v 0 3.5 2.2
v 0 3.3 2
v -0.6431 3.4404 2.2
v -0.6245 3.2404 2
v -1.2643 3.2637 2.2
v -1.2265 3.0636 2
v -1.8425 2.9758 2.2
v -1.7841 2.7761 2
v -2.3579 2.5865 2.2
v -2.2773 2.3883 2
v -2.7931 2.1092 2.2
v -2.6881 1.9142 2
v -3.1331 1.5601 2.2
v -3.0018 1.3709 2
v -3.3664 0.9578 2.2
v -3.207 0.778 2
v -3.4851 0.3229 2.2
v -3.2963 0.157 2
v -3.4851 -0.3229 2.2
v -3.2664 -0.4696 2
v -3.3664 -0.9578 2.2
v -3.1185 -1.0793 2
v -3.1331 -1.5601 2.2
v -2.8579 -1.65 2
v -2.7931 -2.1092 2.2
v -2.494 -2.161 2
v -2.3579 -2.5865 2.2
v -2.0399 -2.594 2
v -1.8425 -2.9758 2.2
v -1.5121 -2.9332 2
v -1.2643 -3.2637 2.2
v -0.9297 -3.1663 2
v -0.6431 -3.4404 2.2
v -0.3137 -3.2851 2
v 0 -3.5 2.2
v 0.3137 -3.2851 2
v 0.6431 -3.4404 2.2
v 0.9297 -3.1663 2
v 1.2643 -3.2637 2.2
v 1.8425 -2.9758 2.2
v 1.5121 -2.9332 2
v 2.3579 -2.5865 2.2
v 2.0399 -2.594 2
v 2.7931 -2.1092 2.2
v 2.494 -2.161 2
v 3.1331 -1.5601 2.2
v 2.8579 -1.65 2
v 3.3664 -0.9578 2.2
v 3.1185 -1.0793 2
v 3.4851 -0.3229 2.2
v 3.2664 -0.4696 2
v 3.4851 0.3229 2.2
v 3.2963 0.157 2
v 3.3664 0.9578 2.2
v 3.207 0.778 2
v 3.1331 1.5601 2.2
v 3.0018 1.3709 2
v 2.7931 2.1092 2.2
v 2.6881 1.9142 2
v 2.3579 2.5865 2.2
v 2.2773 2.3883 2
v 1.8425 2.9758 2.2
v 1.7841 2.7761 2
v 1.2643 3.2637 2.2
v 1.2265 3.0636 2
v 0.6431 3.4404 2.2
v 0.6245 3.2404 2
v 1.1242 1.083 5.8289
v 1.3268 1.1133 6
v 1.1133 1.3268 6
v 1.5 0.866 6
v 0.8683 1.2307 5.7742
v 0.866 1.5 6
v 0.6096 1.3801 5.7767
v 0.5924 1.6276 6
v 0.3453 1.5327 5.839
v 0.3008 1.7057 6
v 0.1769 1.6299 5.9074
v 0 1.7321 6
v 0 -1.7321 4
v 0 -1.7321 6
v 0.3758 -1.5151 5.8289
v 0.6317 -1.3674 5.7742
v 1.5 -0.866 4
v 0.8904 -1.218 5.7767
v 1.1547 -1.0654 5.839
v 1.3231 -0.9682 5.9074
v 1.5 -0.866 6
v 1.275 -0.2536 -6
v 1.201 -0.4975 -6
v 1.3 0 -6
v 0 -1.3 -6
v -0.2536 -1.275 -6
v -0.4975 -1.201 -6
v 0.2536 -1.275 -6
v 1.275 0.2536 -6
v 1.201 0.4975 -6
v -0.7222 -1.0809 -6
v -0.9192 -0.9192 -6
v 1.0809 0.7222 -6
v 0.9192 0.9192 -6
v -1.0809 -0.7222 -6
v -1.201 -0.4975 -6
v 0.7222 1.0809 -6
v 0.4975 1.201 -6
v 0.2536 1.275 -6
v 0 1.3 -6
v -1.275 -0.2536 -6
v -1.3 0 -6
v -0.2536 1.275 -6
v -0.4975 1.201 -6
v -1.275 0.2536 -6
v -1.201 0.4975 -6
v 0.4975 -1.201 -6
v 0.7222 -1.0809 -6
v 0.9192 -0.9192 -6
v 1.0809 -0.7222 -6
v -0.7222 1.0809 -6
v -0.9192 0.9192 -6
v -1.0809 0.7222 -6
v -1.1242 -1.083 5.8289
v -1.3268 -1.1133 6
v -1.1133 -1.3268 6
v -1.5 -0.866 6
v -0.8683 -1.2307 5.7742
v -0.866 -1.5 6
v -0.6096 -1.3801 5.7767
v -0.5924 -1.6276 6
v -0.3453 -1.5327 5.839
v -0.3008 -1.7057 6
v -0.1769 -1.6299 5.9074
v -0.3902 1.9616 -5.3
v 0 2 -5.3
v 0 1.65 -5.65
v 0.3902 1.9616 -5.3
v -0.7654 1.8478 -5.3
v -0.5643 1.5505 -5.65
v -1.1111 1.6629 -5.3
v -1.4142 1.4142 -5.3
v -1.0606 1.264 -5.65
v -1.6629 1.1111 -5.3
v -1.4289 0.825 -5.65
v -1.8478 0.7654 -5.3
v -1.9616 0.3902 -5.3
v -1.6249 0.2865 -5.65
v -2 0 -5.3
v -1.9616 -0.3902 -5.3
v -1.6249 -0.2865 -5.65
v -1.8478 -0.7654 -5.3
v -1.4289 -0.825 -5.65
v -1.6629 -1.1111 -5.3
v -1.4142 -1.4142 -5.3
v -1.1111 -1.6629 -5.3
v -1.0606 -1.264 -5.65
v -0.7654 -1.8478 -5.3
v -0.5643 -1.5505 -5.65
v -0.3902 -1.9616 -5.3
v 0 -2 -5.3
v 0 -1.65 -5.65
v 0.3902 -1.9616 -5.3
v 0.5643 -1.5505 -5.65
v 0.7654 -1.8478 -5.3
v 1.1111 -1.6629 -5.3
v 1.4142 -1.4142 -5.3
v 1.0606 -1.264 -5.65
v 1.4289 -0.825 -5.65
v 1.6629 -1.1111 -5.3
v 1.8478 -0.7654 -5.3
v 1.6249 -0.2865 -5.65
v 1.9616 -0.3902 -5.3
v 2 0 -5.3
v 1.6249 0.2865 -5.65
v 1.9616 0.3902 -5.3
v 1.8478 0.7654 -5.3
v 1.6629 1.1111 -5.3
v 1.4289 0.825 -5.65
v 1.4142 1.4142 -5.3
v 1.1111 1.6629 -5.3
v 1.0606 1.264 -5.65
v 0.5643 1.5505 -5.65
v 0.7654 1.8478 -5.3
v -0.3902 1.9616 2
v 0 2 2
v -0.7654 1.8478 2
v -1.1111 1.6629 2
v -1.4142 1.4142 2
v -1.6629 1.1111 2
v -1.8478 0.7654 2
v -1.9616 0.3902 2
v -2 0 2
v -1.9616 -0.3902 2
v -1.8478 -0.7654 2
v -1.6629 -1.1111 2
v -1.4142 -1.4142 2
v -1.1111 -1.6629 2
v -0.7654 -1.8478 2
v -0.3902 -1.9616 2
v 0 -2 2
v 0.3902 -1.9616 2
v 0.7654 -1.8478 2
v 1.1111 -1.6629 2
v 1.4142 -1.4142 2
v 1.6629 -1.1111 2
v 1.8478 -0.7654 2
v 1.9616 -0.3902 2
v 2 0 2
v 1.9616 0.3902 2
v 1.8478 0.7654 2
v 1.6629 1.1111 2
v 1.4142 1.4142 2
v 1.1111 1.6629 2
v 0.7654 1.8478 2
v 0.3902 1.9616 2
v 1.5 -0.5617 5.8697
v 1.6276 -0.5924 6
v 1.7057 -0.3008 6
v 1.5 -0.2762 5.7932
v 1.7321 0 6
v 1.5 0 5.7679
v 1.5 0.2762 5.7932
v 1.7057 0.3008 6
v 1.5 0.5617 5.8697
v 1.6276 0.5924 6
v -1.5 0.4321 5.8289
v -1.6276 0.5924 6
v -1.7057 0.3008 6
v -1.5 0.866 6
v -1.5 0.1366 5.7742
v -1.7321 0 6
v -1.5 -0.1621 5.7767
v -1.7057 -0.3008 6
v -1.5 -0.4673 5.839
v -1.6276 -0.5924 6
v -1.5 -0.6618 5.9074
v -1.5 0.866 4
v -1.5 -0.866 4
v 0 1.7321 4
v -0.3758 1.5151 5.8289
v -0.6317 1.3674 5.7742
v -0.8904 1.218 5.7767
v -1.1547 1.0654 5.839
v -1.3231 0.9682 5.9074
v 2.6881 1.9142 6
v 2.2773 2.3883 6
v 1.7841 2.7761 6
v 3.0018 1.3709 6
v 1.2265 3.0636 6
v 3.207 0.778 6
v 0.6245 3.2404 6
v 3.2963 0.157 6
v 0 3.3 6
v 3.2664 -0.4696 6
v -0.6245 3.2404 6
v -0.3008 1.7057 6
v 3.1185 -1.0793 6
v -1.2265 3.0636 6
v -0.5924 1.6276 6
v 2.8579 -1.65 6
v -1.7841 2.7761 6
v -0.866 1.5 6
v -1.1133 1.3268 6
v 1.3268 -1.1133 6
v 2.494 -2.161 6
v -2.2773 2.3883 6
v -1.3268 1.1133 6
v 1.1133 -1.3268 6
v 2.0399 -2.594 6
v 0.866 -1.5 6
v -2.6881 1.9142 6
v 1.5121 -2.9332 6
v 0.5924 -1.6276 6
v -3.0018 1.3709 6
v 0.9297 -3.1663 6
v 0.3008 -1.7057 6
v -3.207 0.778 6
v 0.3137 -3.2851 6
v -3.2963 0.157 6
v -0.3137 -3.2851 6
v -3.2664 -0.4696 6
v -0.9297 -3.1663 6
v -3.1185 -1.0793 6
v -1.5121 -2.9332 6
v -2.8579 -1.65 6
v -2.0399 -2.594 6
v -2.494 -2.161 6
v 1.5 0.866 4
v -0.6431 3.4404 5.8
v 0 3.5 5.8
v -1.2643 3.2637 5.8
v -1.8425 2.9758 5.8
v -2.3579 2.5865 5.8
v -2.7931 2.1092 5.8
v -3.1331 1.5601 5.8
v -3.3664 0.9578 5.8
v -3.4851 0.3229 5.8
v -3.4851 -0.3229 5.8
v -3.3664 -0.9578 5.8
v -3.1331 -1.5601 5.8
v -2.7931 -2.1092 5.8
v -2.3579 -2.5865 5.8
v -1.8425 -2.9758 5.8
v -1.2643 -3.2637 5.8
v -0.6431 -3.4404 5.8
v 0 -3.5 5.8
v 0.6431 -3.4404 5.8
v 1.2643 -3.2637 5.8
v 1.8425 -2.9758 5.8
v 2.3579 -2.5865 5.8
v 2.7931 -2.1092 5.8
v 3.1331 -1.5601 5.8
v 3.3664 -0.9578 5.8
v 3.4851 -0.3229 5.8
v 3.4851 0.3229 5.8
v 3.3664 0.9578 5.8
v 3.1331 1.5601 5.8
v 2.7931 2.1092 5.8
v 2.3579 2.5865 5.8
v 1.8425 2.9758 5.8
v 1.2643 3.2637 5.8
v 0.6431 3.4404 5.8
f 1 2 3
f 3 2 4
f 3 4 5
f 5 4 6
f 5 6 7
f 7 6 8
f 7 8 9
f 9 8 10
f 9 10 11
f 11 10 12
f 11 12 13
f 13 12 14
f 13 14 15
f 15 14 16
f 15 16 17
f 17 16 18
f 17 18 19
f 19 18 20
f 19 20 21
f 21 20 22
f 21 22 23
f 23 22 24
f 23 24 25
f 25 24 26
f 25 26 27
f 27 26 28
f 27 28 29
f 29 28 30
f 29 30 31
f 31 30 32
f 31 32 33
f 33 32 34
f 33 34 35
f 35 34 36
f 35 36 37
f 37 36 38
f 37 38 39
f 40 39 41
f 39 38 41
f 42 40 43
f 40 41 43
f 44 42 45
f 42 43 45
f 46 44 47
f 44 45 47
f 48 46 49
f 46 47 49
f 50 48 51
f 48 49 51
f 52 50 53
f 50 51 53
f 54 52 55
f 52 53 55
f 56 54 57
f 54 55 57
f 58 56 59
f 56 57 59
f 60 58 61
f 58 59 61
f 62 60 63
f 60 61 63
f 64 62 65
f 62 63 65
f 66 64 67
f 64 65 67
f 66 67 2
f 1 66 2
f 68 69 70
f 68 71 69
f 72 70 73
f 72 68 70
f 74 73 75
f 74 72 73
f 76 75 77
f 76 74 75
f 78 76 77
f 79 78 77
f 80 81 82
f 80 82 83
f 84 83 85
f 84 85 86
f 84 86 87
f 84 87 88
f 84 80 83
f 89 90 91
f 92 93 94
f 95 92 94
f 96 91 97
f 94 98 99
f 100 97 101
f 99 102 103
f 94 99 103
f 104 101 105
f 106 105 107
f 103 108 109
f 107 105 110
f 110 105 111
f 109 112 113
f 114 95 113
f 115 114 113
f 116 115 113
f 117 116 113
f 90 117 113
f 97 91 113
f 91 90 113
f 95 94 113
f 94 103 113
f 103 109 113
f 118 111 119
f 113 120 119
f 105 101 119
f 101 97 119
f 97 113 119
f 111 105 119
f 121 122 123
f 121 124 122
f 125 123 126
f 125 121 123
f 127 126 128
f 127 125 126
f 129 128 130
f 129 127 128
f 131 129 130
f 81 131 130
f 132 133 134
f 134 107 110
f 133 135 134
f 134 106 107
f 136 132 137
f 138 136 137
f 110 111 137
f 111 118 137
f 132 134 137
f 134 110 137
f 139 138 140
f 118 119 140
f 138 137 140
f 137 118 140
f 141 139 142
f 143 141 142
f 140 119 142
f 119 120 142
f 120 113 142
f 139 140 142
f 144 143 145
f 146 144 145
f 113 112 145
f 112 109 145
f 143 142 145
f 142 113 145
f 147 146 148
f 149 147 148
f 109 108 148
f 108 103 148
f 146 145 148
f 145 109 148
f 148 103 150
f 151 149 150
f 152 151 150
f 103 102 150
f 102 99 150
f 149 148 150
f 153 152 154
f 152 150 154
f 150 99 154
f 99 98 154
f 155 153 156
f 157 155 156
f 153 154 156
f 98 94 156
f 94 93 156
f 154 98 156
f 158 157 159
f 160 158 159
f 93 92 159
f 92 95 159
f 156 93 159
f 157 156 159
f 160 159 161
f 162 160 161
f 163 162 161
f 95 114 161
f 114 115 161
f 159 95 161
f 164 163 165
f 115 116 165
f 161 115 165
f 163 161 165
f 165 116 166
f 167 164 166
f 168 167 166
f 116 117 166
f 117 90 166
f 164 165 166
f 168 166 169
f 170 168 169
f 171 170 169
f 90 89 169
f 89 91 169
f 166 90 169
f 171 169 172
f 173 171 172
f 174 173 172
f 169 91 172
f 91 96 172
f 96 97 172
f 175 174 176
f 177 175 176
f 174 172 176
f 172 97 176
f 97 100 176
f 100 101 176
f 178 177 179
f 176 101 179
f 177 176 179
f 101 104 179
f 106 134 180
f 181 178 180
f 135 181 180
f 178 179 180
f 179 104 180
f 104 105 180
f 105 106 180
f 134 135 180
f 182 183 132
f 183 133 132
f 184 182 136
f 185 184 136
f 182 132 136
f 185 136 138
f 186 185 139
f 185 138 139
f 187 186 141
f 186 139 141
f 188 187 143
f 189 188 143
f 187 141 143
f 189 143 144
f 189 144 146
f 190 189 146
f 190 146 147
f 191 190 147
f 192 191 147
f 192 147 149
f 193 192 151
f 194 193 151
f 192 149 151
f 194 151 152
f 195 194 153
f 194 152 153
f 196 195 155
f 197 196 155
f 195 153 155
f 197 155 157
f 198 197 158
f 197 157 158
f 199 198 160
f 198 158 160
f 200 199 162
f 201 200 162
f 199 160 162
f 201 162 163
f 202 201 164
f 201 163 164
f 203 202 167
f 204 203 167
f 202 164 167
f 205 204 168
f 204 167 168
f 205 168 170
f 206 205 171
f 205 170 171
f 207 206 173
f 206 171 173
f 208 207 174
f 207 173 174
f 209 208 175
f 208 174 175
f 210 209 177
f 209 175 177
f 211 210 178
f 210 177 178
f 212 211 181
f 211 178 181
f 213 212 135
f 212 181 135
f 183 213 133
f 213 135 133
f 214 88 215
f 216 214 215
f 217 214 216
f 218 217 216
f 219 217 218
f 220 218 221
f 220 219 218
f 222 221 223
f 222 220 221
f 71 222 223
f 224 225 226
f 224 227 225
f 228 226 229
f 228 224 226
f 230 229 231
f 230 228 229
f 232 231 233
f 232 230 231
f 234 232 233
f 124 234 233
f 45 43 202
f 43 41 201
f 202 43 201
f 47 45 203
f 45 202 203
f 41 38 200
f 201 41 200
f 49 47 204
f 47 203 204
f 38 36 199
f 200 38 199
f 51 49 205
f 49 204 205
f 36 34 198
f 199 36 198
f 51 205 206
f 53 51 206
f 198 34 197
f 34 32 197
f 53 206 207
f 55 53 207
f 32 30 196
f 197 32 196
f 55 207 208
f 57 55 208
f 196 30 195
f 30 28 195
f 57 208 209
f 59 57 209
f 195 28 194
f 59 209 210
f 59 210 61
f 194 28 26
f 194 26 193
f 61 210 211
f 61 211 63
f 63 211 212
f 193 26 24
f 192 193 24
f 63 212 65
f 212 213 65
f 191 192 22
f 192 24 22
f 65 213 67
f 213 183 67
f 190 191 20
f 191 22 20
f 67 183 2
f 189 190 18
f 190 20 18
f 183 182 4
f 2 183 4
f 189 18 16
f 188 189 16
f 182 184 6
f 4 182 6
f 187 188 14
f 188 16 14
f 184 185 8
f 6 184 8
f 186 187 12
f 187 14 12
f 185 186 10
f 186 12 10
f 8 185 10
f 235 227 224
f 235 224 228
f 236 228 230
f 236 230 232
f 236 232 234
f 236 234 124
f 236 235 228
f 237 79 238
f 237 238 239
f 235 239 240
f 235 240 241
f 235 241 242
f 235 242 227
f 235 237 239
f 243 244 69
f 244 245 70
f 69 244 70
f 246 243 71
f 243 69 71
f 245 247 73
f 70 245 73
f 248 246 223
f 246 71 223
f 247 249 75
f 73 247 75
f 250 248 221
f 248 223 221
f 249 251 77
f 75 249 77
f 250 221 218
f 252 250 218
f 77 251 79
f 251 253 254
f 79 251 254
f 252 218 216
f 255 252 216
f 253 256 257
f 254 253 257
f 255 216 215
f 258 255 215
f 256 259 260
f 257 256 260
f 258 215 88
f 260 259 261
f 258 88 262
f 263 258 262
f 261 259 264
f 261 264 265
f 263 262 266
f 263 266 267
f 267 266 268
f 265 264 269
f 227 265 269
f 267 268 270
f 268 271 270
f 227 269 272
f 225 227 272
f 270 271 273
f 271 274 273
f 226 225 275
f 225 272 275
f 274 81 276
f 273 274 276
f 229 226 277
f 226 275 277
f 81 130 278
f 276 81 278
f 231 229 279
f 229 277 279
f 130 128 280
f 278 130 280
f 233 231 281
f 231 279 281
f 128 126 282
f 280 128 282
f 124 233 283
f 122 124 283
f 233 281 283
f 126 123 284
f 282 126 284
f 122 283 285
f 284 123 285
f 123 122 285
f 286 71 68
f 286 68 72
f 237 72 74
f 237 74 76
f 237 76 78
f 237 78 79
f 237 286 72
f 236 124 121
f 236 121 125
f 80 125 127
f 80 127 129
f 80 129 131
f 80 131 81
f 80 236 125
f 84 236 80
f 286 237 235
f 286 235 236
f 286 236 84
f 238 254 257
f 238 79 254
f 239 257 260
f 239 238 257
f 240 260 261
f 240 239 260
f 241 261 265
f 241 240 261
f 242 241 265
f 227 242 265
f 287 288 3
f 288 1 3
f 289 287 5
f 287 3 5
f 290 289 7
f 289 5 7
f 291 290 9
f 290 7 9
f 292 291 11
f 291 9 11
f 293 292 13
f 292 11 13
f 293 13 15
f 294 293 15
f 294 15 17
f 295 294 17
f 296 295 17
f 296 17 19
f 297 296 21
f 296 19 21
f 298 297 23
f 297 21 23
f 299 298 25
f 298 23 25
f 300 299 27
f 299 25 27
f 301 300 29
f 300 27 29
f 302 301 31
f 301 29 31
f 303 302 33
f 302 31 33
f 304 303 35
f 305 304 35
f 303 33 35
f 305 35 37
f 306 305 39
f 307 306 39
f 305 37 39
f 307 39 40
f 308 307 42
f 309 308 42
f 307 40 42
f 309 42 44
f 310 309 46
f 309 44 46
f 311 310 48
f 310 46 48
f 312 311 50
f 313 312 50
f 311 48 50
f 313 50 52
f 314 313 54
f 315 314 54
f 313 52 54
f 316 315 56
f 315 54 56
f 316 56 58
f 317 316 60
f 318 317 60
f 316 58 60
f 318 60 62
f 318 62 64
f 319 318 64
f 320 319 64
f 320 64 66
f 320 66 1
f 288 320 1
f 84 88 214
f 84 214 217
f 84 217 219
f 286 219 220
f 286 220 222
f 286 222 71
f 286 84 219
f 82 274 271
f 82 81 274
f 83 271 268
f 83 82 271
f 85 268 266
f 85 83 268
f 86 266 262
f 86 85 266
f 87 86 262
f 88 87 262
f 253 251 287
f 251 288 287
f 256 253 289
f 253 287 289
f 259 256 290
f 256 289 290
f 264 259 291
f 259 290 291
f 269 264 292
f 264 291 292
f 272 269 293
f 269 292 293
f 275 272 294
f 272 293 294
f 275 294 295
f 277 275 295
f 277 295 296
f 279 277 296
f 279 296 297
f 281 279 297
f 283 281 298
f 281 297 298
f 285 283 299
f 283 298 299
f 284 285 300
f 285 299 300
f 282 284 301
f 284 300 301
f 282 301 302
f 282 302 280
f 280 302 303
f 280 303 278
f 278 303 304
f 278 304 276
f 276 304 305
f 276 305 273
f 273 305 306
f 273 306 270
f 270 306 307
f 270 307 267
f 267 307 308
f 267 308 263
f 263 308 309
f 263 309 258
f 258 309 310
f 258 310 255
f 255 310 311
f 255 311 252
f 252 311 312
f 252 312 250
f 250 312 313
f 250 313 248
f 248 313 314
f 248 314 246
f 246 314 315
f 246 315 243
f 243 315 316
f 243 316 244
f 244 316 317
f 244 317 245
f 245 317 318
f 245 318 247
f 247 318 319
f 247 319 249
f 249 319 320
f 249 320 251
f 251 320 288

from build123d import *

# Parameters (mm, degrees)
CUT_EXTRUDE1_START = -2
CUT_EXTRUDE1_DEPTH = 2
SKETCH4_R          = 1.732050808
CUT_EXTRUDE2_DEPTH = 0.5
CUT_EXTRUDE2_TAPER = 45


with BuildPart() as part:
    # Sketch2 → Revolve1 (revolve)
    with BuildSketch(Plane(origin=(0, 0, 0), x_dir=(0, 0, -1), z_dir=(1, 0, 0))):
        Polygon((-5.8, 3.5), (-2.2, 3.5), (-2, 3.3), (-2, 2), (5.3, 2), (6, 1.3), (6, 0), (-6, 0), (-6, 3.3), align=None)
    revolve(axis=Axis((0, 0, -6), (0, 0, 1)))

    # Sketch3 → Cut-Extrude1 (cut)
    with BuildSketch(Plane.XY.offset(6).offset(CUT_EXTRUDE1_START)):
        Polygon((0, 1.732050808), (-1.5, 0.866025404), (-1.5, -0.866025404), (0, -1.732050808), (1.5, -0.866025404), (1.5, 0.866025404), align=None)
    extrude(amount=CUT_EXTRUDE1_DEPTH, mode=Mode.SUBTRACT)

    # Sketch4 → Cut-Extrude2 (cut)
    with BuildSketch(Plane.XY.offset(6)):
        Circle(SKETCH4_R)
    extrude(amount=-CUT_EXTRUDE2_DEPTH, taper=CUT_EXTRUDE2_TAPER, mode=Mode.SUBTRACT)


solid = part.part
